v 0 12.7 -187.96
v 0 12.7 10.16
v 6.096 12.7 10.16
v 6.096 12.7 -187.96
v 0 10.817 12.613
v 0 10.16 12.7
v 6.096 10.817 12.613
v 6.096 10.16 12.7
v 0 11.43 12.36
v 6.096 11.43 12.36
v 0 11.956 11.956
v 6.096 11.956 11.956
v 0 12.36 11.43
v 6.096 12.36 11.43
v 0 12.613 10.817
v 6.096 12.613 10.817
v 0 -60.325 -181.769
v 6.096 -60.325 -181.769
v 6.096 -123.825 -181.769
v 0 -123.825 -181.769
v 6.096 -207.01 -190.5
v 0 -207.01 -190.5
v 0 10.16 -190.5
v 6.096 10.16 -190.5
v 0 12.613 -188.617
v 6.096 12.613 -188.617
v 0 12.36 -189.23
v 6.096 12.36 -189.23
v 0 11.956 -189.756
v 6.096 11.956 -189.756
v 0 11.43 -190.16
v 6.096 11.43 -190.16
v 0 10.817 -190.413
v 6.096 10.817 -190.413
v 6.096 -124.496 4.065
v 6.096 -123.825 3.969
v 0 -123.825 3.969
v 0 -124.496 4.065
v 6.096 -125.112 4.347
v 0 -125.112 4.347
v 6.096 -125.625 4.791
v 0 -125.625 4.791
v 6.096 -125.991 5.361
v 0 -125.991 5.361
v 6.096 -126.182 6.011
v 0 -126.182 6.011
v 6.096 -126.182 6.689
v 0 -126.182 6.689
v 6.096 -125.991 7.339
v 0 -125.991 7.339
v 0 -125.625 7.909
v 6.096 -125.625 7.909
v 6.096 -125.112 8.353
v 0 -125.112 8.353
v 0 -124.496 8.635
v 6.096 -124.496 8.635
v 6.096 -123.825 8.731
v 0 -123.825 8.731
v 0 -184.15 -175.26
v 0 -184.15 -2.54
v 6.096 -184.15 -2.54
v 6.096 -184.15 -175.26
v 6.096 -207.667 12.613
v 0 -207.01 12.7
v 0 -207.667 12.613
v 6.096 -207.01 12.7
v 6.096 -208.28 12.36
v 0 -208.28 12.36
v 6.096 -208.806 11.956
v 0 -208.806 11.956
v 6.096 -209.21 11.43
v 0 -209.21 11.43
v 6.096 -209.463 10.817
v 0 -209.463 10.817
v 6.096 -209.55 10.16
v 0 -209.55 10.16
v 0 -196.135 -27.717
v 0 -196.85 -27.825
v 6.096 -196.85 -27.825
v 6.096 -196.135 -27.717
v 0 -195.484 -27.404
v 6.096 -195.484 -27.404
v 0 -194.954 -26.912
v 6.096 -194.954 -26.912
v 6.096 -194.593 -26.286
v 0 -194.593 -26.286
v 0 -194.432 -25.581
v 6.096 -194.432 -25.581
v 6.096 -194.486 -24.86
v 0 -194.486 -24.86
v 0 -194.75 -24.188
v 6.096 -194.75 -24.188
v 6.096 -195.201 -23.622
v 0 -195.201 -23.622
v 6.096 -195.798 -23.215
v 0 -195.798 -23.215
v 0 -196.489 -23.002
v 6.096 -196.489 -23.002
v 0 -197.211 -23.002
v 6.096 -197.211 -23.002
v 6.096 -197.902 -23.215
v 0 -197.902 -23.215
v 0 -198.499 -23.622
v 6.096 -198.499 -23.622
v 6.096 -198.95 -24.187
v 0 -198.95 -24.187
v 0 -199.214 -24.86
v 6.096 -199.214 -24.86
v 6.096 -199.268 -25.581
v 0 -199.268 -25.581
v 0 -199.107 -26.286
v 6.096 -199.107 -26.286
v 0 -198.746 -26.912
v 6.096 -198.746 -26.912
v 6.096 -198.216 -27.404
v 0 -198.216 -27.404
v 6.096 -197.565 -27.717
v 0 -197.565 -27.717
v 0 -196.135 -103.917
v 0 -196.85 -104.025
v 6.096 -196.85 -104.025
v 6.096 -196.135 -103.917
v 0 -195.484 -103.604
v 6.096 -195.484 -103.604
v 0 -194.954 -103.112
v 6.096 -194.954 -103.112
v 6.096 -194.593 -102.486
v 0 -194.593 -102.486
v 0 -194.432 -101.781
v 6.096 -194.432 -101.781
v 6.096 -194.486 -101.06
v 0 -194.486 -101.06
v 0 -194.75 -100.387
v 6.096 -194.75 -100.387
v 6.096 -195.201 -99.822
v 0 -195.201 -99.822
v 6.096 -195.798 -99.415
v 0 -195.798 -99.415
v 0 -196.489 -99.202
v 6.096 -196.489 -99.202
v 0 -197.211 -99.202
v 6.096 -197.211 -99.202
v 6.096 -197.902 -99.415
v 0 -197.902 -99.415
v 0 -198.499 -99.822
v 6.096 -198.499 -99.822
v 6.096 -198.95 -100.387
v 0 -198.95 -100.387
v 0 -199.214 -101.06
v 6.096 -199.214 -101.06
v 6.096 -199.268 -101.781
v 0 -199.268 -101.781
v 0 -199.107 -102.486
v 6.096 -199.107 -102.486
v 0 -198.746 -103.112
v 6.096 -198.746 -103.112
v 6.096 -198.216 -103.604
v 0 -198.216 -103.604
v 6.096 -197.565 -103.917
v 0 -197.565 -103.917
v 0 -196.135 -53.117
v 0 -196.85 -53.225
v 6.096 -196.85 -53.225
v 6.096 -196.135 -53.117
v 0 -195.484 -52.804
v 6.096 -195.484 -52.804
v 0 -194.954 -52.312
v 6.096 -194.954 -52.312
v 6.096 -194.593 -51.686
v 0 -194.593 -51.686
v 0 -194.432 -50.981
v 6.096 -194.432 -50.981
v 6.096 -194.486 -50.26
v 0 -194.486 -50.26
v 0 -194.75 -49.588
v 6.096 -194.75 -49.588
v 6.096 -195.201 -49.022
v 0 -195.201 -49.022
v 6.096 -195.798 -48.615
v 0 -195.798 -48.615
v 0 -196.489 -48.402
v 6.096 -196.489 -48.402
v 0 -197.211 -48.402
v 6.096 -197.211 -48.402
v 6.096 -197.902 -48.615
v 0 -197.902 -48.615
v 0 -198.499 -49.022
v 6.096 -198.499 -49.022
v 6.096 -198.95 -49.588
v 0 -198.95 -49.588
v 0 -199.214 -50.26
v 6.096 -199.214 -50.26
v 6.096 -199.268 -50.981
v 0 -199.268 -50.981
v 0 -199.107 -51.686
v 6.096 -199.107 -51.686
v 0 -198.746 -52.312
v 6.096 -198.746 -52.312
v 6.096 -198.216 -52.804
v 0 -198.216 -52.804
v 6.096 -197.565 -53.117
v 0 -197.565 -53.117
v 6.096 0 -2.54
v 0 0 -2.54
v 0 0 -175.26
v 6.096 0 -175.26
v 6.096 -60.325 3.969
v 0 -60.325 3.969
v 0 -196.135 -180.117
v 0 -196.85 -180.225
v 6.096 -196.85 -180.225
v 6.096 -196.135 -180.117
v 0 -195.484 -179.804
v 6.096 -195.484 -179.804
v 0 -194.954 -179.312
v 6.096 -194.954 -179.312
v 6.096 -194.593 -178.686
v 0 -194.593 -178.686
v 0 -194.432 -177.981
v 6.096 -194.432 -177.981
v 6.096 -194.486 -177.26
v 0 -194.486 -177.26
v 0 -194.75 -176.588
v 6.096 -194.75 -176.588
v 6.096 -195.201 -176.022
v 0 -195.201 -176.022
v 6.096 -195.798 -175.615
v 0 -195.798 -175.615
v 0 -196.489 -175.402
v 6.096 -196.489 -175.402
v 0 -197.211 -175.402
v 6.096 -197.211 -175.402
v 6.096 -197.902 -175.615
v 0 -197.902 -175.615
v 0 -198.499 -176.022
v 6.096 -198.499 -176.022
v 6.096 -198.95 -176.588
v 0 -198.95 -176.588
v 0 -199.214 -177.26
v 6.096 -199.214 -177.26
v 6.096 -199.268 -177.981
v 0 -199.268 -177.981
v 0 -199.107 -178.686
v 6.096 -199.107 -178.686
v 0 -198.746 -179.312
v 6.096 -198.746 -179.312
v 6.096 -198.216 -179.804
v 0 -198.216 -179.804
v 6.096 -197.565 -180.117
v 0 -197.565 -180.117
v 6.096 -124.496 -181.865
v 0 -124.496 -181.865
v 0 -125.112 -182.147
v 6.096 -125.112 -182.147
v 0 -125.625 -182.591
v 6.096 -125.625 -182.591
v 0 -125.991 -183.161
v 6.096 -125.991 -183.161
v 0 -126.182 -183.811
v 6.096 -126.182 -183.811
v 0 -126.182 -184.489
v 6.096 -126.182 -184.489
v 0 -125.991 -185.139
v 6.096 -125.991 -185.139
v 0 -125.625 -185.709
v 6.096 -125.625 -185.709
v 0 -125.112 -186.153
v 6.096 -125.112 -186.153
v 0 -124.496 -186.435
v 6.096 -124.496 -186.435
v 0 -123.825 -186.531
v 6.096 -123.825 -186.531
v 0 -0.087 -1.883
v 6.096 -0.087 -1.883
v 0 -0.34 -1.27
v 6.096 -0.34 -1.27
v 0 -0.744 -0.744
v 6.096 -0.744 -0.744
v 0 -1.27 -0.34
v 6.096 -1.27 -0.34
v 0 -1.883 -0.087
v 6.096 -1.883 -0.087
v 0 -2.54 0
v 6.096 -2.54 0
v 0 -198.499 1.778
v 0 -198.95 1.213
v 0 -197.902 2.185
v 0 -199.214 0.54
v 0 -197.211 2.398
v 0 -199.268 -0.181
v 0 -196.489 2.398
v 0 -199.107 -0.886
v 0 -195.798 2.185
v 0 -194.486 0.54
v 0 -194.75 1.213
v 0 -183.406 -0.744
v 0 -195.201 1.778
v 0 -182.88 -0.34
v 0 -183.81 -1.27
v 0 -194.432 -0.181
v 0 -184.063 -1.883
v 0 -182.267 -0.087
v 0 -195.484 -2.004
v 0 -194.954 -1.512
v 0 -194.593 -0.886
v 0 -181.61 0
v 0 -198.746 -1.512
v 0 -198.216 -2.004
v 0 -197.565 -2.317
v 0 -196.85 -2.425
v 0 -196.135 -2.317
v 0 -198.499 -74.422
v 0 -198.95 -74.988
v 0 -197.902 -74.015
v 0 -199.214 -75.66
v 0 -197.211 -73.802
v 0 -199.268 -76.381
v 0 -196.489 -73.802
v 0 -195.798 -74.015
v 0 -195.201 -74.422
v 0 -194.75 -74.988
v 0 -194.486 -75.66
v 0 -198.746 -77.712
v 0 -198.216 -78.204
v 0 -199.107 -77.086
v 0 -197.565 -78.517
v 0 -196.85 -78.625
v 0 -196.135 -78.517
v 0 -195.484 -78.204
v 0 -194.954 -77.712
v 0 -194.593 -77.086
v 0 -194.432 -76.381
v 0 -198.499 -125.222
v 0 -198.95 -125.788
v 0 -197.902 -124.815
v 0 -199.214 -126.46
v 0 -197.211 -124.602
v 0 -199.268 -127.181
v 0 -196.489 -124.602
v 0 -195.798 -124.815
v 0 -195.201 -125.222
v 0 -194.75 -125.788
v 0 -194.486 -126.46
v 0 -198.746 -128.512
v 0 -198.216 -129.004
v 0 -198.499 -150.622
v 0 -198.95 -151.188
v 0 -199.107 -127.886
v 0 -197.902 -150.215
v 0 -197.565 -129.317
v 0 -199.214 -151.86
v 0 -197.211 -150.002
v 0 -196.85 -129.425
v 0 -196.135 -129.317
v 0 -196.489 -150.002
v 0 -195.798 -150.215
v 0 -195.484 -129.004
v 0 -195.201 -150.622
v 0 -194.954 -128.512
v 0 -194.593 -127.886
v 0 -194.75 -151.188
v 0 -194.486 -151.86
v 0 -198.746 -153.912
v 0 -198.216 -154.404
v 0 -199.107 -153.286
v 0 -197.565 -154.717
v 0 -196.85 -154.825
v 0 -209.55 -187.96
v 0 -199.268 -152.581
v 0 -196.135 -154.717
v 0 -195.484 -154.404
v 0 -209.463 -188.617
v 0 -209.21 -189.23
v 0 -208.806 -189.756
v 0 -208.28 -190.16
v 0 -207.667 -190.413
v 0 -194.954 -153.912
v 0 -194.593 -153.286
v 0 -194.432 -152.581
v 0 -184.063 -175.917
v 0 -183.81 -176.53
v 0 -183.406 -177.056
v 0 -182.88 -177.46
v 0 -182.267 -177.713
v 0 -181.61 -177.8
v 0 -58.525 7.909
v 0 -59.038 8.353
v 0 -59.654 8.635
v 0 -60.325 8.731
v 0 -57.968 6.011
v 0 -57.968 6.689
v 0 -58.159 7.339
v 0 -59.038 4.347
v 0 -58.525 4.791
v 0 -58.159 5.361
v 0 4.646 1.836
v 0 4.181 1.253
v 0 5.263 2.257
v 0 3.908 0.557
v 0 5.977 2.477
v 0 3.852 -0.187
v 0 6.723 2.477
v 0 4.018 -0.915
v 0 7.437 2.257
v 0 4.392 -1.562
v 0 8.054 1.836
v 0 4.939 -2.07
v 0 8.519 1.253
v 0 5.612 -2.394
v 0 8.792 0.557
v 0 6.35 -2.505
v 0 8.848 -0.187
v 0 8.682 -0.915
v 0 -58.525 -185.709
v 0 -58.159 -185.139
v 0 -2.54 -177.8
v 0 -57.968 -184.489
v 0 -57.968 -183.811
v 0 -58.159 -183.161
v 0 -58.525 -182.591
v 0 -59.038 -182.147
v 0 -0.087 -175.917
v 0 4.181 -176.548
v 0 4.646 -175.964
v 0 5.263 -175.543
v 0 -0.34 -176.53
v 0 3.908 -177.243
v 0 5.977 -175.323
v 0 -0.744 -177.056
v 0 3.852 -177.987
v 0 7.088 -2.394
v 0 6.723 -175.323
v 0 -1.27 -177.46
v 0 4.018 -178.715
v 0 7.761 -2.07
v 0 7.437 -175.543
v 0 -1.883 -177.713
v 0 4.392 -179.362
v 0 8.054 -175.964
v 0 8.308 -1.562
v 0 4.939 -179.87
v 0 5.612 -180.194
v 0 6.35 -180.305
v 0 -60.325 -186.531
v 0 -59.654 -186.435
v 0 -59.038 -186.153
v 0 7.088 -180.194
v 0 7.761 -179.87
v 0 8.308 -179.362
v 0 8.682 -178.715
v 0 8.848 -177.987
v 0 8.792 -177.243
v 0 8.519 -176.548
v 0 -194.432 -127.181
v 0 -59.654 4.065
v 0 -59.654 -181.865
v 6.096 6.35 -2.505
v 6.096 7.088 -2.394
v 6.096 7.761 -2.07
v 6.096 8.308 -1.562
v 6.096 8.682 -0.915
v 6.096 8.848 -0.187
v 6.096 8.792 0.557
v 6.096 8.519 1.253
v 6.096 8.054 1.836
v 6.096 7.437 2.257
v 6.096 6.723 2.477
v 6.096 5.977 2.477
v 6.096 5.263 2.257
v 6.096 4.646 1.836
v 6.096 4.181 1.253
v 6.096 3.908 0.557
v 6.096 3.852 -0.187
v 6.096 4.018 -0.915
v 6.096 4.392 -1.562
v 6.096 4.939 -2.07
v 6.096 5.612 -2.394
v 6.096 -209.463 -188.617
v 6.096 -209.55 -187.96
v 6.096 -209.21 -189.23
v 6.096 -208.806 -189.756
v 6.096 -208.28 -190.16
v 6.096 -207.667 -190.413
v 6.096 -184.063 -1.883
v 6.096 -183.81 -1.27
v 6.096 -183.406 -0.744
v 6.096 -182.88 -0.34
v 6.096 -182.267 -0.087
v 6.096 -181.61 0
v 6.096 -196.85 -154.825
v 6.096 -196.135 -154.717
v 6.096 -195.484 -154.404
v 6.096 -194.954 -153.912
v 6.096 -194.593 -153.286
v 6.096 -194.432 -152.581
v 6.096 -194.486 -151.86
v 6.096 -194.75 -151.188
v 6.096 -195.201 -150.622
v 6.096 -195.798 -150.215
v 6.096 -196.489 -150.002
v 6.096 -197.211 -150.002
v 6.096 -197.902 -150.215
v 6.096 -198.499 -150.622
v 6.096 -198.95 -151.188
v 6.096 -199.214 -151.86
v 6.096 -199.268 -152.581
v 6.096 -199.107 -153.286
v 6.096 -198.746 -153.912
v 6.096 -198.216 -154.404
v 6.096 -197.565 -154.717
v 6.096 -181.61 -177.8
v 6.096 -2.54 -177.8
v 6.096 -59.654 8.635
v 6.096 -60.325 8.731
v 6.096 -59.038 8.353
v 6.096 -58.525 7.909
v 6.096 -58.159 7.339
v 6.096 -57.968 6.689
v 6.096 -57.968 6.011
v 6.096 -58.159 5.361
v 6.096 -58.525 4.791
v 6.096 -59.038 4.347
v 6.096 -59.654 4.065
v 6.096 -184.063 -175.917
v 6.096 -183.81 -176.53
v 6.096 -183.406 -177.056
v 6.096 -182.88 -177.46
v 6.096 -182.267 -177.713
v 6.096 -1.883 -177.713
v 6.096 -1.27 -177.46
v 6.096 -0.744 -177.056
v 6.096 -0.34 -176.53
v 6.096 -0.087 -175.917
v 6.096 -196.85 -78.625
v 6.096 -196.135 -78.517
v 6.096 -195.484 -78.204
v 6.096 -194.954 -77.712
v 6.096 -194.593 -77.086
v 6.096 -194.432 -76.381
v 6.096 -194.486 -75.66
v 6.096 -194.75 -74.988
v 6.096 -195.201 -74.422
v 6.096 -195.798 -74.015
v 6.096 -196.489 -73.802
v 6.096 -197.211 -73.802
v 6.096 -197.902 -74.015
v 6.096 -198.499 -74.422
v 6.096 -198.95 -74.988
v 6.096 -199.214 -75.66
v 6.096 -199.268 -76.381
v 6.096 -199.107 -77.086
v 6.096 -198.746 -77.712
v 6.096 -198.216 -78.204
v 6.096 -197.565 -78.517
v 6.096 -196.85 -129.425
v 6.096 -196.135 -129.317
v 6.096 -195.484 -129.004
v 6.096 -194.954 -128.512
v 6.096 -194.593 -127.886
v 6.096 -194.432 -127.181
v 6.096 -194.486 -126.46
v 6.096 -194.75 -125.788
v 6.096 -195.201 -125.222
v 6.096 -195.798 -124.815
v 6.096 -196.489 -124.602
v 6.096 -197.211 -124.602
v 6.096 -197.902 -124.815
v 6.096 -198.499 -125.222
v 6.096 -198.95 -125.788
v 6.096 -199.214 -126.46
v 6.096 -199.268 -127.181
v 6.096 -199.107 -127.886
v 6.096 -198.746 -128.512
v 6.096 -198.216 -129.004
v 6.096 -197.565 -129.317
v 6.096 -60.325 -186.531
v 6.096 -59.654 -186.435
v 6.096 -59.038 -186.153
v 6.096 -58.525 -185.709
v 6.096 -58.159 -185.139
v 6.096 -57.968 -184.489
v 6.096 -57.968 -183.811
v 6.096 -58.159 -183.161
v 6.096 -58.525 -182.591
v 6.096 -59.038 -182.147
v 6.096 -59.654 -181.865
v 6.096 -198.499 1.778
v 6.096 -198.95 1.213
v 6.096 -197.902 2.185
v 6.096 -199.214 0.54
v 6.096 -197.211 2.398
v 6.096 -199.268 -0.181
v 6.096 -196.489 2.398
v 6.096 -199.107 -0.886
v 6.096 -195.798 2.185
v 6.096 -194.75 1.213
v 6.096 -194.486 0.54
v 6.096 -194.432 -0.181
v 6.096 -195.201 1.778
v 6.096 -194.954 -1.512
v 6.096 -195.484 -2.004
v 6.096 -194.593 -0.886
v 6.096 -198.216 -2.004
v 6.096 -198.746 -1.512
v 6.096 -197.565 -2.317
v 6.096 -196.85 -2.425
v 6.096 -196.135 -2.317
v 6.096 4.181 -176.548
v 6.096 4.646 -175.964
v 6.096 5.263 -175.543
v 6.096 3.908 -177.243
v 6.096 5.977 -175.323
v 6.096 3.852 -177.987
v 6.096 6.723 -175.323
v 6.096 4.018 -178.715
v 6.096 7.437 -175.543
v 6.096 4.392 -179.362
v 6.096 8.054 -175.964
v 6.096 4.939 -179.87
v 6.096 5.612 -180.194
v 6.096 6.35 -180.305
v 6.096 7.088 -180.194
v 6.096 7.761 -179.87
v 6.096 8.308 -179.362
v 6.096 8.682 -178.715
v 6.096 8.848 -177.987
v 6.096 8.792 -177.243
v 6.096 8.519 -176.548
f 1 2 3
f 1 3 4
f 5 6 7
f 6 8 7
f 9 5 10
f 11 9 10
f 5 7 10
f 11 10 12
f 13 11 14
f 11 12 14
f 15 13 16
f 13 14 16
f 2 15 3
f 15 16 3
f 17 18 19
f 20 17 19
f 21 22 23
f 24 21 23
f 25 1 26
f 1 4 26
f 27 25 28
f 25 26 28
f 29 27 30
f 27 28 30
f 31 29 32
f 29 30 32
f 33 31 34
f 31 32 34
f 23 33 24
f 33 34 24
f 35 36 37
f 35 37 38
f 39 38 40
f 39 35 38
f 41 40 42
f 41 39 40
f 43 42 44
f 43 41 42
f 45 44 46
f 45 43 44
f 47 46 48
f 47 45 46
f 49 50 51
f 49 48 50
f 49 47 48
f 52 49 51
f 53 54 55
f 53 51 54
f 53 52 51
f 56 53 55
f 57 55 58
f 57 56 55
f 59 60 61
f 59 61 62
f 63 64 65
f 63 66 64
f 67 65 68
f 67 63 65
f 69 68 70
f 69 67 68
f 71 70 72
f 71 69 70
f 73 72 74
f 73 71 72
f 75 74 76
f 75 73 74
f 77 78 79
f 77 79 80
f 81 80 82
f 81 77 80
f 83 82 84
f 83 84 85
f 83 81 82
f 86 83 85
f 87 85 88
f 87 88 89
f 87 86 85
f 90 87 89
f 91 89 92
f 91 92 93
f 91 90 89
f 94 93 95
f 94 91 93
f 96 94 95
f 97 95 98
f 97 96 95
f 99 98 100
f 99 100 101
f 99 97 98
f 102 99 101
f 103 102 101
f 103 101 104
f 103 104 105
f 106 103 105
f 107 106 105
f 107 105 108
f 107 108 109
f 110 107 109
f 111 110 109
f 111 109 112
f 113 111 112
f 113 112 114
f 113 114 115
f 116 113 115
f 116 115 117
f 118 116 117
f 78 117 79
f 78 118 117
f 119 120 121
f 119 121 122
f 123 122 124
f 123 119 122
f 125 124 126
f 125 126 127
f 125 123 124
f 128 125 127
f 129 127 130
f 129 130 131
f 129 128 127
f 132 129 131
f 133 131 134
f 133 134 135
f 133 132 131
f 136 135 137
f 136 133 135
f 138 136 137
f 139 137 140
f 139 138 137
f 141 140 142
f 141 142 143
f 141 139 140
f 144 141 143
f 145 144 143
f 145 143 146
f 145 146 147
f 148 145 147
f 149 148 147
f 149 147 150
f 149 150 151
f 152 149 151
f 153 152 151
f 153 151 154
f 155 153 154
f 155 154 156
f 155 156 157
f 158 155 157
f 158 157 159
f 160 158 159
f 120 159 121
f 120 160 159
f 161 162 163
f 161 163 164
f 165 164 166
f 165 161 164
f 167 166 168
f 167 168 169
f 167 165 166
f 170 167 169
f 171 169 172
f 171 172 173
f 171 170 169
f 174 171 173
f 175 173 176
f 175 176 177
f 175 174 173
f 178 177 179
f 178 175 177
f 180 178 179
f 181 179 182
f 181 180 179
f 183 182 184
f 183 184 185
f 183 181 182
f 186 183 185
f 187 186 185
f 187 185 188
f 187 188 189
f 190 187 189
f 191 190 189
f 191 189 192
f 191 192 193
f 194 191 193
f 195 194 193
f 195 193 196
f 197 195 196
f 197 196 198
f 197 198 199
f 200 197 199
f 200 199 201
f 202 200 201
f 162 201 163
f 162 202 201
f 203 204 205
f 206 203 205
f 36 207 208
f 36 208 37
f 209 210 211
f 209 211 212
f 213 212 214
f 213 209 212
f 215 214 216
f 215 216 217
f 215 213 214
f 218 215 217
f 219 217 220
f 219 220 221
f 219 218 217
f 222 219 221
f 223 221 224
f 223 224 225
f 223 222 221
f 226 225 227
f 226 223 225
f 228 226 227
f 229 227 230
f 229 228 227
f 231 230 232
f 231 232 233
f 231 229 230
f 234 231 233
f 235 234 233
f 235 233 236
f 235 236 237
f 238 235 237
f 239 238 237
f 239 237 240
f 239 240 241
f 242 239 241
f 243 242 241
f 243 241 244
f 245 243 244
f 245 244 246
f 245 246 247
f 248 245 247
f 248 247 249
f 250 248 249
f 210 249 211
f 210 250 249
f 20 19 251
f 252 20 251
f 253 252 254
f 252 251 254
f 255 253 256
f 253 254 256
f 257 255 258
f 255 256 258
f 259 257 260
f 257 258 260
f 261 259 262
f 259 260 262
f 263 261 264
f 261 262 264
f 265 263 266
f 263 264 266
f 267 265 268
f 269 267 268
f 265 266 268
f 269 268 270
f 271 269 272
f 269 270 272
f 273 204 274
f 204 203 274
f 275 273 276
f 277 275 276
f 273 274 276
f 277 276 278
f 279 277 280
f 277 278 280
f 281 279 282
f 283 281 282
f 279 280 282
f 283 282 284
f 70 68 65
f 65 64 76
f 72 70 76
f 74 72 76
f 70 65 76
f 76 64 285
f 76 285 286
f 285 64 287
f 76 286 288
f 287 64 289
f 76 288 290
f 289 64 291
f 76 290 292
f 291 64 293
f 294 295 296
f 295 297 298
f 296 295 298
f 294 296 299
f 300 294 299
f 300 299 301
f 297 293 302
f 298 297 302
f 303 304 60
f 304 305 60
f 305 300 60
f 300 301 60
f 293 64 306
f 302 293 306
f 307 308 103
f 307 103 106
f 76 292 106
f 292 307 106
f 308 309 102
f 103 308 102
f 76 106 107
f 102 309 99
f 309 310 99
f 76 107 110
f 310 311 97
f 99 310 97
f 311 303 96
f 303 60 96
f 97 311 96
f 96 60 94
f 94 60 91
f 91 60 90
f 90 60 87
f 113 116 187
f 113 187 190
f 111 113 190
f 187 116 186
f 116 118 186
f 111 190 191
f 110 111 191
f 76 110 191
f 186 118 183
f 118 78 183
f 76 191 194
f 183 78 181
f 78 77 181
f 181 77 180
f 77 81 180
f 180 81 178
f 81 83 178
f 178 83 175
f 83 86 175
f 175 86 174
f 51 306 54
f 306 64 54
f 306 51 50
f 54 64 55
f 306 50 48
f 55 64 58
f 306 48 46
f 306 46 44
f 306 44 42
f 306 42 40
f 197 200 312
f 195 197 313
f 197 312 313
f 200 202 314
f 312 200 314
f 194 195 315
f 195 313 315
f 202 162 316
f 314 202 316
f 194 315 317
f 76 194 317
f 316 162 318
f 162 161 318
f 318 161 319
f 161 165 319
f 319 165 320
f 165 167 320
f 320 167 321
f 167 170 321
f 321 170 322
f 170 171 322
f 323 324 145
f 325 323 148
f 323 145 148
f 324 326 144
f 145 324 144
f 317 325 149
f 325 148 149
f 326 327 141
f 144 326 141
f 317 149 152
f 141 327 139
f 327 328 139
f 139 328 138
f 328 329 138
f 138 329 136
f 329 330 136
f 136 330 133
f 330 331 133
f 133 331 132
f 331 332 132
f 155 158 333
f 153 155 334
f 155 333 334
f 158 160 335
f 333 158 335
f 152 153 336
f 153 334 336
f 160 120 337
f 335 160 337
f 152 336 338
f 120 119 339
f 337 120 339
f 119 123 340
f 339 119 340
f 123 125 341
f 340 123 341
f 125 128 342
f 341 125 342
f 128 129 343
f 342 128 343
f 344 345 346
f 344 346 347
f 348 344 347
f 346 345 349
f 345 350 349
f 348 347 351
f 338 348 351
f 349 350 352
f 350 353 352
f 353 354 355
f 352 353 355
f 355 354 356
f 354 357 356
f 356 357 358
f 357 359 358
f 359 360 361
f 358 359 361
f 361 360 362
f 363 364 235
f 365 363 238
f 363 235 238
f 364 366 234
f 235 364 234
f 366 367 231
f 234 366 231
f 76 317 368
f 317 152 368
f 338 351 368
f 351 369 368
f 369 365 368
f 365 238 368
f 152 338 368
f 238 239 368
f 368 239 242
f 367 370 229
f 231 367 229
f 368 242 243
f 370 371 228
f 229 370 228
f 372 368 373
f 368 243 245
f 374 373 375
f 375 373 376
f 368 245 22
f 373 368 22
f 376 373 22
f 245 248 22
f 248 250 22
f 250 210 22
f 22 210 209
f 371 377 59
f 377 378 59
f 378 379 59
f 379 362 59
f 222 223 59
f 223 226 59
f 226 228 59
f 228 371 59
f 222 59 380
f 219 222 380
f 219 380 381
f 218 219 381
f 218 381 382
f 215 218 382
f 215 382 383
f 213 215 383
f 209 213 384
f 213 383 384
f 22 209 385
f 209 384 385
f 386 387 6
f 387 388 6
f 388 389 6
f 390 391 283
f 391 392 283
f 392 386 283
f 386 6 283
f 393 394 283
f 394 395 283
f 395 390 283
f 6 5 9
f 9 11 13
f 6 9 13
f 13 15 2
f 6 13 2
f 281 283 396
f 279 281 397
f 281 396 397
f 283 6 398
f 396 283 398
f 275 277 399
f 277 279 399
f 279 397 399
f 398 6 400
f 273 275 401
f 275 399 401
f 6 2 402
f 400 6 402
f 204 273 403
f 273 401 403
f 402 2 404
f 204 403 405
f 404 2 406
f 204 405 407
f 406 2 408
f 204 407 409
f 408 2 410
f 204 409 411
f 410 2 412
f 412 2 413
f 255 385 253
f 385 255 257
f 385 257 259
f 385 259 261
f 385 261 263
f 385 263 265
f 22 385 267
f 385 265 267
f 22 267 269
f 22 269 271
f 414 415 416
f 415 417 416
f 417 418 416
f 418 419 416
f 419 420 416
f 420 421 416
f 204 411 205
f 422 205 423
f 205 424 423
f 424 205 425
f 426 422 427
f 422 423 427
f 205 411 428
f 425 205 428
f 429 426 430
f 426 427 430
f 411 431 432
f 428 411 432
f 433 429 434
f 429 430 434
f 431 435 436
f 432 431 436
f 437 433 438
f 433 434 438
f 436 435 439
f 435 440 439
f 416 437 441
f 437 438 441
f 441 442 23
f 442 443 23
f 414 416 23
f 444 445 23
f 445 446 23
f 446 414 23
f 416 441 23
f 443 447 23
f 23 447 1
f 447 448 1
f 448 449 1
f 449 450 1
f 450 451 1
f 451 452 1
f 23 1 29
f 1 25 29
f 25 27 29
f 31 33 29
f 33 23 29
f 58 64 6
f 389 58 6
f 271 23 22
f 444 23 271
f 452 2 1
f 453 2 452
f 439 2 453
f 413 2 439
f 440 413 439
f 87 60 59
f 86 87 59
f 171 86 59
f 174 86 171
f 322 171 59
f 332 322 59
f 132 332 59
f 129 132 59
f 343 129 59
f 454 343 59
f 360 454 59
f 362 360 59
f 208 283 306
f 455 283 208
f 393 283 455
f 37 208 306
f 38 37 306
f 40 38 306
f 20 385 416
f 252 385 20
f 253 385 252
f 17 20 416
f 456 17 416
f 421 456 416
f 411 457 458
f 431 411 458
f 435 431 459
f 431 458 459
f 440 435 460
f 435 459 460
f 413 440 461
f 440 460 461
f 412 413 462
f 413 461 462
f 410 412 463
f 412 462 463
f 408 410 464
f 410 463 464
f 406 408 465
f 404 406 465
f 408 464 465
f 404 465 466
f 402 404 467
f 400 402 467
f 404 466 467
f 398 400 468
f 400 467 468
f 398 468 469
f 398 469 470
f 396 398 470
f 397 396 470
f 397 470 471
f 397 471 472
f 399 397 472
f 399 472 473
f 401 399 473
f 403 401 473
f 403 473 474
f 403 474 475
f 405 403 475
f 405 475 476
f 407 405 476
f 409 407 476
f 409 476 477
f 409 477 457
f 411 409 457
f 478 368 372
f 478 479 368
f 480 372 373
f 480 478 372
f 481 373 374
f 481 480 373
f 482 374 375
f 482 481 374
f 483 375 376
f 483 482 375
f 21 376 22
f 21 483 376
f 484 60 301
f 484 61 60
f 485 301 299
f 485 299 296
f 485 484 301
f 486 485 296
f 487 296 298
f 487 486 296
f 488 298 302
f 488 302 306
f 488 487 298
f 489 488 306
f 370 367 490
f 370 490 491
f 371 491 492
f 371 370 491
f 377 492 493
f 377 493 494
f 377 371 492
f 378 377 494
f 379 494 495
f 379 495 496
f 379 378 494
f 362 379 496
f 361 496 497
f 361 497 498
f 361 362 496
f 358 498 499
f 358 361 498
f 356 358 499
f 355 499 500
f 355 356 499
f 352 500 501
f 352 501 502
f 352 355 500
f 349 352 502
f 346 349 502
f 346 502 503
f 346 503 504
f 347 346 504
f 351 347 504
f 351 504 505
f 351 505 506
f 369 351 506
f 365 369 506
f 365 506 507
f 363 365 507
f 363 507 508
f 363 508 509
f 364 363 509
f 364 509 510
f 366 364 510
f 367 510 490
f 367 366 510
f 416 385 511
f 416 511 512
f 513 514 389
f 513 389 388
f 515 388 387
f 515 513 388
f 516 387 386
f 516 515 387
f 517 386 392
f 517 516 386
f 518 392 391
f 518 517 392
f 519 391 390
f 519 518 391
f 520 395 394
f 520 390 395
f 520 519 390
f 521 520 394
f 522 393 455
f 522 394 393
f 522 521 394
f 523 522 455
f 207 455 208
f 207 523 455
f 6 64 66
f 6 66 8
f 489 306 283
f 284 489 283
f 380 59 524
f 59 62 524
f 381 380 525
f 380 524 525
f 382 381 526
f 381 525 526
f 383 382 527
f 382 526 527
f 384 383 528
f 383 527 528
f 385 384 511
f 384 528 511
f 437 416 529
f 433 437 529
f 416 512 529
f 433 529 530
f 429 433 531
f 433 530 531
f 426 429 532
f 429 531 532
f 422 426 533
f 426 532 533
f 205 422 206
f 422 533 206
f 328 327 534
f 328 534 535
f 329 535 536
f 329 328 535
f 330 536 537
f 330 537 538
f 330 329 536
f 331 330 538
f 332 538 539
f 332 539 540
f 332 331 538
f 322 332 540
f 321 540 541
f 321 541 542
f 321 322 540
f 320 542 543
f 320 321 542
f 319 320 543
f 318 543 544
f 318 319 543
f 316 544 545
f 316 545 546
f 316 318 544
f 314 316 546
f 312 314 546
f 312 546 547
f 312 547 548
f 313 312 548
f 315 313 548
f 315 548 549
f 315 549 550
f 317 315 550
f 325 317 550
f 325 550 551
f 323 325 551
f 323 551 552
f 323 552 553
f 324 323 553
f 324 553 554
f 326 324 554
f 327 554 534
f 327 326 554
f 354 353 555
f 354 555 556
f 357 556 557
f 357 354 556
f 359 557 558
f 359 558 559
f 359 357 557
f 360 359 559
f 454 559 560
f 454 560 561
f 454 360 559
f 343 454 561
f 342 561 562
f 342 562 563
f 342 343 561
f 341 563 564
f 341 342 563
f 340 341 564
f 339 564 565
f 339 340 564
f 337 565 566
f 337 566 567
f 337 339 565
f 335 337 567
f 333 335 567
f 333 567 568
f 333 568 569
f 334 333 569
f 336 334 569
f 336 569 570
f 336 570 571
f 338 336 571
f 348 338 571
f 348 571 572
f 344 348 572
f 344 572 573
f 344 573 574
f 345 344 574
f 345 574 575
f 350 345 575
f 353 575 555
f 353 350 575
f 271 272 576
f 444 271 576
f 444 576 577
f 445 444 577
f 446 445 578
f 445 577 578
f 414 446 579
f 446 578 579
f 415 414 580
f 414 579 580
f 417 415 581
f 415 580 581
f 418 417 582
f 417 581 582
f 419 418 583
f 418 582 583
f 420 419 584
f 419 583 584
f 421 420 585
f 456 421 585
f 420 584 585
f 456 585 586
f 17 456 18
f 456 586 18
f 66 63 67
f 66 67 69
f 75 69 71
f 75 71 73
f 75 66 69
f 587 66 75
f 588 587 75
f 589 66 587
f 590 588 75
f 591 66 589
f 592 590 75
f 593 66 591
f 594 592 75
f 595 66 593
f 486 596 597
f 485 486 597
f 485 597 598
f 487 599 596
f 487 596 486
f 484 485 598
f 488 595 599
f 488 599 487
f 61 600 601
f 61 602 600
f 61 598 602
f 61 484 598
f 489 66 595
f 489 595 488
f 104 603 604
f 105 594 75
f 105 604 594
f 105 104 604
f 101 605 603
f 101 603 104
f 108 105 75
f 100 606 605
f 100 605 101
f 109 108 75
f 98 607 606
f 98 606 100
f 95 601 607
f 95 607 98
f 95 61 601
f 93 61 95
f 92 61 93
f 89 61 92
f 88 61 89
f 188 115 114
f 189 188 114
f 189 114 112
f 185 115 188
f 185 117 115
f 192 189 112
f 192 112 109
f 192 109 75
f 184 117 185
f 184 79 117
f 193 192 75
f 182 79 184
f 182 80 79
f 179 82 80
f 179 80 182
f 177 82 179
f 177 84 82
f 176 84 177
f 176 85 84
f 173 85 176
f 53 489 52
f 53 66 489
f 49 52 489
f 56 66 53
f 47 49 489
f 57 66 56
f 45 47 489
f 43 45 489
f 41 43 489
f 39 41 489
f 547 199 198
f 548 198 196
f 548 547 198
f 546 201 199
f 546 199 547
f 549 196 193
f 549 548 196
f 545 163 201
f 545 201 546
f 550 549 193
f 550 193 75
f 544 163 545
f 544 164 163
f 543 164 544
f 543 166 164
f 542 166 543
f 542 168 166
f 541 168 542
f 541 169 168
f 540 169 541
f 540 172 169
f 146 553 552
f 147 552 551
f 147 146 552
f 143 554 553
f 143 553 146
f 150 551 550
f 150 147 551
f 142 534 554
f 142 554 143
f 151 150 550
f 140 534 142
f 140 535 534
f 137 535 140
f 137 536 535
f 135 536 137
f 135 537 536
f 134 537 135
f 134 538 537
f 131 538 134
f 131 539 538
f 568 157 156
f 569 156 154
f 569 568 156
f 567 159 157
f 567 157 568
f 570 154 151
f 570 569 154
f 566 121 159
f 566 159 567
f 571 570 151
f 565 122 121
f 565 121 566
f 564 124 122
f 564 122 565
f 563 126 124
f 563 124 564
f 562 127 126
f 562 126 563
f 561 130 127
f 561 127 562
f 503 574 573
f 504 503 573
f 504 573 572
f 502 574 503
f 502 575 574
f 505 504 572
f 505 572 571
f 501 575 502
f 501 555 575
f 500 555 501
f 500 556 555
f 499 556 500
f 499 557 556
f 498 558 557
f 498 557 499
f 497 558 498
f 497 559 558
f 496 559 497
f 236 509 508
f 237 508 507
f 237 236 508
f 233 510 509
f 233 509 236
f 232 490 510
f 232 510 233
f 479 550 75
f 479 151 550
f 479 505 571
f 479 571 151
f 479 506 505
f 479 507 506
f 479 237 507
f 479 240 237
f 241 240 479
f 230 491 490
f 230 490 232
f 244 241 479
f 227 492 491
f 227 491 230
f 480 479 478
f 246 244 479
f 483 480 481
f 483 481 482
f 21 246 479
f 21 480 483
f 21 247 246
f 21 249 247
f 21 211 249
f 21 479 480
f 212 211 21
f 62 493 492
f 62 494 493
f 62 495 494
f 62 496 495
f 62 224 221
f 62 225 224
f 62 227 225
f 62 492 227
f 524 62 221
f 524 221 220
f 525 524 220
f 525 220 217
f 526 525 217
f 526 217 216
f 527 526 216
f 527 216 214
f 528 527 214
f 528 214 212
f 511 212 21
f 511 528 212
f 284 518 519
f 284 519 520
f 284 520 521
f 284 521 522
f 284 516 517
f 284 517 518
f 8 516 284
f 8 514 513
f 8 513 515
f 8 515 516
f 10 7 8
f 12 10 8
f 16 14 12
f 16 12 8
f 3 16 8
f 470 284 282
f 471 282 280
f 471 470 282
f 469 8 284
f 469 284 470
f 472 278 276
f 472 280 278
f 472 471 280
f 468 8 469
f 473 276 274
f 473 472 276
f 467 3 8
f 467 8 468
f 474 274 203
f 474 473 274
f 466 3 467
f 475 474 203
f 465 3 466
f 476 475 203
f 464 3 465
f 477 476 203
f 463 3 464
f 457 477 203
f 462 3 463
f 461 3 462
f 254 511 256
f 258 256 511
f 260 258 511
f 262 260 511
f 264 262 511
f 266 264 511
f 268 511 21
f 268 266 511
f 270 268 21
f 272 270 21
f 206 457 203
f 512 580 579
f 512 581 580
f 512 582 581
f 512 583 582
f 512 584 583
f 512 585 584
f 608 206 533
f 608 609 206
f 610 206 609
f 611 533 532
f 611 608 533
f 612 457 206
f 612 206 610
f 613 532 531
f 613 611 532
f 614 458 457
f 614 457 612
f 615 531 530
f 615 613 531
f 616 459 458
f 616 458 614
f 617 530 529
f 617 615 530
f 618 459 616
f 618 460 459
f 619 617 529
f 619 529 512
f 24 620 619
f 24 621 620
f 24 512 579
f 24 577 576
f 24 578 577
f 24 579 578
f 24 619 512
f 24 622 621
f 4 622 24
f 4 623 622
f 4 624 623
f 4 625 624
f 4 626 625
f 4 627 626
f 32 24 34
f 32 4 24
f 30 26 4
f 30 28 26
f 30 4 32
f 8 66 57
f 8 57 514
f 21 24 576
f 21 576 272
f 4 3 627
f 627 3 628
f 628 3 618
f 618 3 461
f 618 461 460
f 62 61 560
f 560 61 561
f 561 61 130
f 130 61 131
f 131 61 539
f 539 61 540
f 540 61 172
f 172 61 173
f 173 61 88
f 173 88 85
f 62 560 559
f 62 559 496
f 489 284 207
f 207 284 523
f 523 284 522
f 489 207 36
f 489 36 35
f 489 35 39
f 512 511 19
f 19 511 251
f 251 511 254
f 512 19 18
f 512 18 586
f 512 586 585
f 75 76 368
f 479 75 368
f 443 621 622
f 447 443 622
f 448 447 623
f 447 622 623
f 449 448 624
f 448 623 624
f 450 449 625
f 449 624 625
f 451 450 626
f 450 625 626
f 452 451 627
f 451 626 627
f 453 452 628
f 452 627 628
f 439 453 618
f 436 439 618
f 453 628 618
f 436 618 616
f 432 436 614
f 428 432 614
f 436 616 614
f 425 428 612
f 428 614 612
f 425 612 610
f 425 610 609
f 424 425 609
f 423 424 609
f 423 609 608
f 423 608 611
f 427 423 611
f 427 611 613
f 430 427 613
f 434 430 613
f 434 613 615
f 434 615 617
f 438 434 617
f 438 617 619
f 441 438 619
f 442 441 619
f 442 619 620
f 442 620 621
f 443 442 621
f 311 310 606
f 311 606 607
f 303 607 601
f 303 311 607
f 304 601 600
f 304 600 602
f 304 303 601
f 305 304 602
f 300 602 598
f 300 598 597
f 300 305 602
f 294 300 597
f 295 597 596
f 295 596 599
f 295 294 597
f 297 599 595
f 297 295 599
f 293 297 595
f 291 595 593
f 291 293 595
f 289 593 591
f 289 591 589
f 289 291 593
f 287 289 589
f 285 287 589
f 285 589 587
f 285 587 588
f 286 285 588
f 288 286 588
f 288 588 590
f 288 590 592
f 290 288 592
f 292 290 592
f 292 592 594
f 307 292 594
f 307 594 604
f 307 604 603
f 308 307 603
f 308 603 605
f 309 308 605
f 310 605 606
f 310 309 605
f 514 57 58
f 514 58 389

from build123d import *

# Parameters (mm, degrees)
SKETCH1_W               = 203.2
SKETCH1_H               = 222.25
SKETCH1_R               = 2.425
SKETCH1_W_2             = 177.8
SKETCH1_H_2             = 184.15
BOSS_EXTRUDE1_DEPTH     = 6.096
FILLET1_R               = 2.54
CUT_EXTRUDE1_DEPTH      = 7.096
SKETCH3_R               = 2.505
CUT_EXTRUDE2_DEPTH      = 1
CUT_EXTRUDE2_DEPTH_BACK = 7.096


with BuildPart() as part:
    # Sketch1 → Boss-Extrude1 (new body)
    with BuildSketch(Plane(origin=(0, 0, 0), x_dir=(0, 0, -1), z_dir=(1, 0, 0))):
        with Locations((88.9, -98.425)):
            Rectangle(SKETCH1_W, SKETCH1_H)
        with Locations((0, -196.85)):
            Circle(SKETCH1_R, mode=Mode.SUBTRACT)
        with Locations((25.4, -196.85)):
            Circle(SKETCH1_R, mode=Mode.SUBTRACT)
        with Locations((50.8, -196.85)):
            Circle(SKETCH1_R, mode=Mode.SUBTRACT)
        with Locations((76.2, -196.85)):
            Circle(SKETCH1_R, mode=Mode.SUBTRACT)
        with Locations((101.6, -196.85)):
            Circle(SKETCH1_R, mode=Mode.SUBTRACT)
        with Locations((127, -196.85)):
            Circle(SKETCH1_R, mode=Mode.SUBTRACT)
        with Locations((152.4, -196.85)):
            Circle(SKETCH1_R, mode=Mode.SUBTRACT)
        with Locations((177.8, -196.85)):
            Circle(SKETCH1_R, mode=Mode.SUBTRACT)
        with Locations((88.9, -92.075)):
            Rectangle(SKETCH1_W_2, SKETCH1_H_2, mode=Mode.SUBTRACT)
    extrude(amount=BOSS_EXTRUDE1_DEPTH)

    # Fillet1
    fillet1_edges = [part.edges().sort_by_distance(p)[0] for p in [
        (3.048, 0, 0),
        (3.048, -184.15, 0),
        (3.048, -184.15, -177.8),
        (3.048, 0, -177.8),
        (3.048, 12.7, 12.7),
        (3.048, 12.7, -190.5),
        (3.048, -209.55, -190.5),
        (3.048, -209.55, 12.7),
    ]]
    fillet(fillet1_edges, radius=FILLET1_R)

    # Sketch2 → Cut-Extrude1 (cut, through all)
    with BuildSketch(Plane(origin=(6.096, 0, 0), x_dir=(0, 0, -1), z_dir=(1, 0, 0))):
        with BuildLine():
            Line((-3.96875, -60.325), (-3.96875, -123.825))
            ThreePointArc((-3.96875, -123.825), (-6.35, -126.20625), (-8.73125, -123.825))
            Line((-8.73125, -123.825), (-8.73125, -60.325))
            ThreePointArc((-8.73125, -60.325), (-6.35, -57.94375), (-3.96875, -60.325))
        make_face()
        with BuildLine():
            Line((181.76875, -60.325), (181.76875, -123.825))
            ThreePointArc((181.76875, -123.825), (184.15, -126.20625), (186.53125, -123.825))
            Line((186.53125, -123.825), (186.53125, -60.325))
            ThreePointArc((186.53125, -60.325), (184.15, -57.94375), (181.76875, -60.325))
        make_face()
    extrude(amount=-CUT_EXTRUDE1_DEPTH, mode=Mode.SUBTRACT)

    # Sketch3 → Cut-Extrude2 (cut, two sides)
    with BuildSketch(Plane(origin=(6.096, 0, 0), x_dir=(0, 0, -1), z_dir=(1, 0, 0))) as cut_extrude2_sk:
        with Locations((177.8, 6.35)):
            Circle(SKETCH3_R)
        with Locations((0, 6.35)):
            Circle(SKETCH3_R)
    extrude(amount=CUT_EXTRUDE2_DEPTH, mode=Mode.SUBTRACT)
    extrude(cut_extrude2_sk.sketch, amount=-CUT_EXTRUDE2_DEPTH_BACK, mode=Mode.SUBTRACT)


solid = part.part
